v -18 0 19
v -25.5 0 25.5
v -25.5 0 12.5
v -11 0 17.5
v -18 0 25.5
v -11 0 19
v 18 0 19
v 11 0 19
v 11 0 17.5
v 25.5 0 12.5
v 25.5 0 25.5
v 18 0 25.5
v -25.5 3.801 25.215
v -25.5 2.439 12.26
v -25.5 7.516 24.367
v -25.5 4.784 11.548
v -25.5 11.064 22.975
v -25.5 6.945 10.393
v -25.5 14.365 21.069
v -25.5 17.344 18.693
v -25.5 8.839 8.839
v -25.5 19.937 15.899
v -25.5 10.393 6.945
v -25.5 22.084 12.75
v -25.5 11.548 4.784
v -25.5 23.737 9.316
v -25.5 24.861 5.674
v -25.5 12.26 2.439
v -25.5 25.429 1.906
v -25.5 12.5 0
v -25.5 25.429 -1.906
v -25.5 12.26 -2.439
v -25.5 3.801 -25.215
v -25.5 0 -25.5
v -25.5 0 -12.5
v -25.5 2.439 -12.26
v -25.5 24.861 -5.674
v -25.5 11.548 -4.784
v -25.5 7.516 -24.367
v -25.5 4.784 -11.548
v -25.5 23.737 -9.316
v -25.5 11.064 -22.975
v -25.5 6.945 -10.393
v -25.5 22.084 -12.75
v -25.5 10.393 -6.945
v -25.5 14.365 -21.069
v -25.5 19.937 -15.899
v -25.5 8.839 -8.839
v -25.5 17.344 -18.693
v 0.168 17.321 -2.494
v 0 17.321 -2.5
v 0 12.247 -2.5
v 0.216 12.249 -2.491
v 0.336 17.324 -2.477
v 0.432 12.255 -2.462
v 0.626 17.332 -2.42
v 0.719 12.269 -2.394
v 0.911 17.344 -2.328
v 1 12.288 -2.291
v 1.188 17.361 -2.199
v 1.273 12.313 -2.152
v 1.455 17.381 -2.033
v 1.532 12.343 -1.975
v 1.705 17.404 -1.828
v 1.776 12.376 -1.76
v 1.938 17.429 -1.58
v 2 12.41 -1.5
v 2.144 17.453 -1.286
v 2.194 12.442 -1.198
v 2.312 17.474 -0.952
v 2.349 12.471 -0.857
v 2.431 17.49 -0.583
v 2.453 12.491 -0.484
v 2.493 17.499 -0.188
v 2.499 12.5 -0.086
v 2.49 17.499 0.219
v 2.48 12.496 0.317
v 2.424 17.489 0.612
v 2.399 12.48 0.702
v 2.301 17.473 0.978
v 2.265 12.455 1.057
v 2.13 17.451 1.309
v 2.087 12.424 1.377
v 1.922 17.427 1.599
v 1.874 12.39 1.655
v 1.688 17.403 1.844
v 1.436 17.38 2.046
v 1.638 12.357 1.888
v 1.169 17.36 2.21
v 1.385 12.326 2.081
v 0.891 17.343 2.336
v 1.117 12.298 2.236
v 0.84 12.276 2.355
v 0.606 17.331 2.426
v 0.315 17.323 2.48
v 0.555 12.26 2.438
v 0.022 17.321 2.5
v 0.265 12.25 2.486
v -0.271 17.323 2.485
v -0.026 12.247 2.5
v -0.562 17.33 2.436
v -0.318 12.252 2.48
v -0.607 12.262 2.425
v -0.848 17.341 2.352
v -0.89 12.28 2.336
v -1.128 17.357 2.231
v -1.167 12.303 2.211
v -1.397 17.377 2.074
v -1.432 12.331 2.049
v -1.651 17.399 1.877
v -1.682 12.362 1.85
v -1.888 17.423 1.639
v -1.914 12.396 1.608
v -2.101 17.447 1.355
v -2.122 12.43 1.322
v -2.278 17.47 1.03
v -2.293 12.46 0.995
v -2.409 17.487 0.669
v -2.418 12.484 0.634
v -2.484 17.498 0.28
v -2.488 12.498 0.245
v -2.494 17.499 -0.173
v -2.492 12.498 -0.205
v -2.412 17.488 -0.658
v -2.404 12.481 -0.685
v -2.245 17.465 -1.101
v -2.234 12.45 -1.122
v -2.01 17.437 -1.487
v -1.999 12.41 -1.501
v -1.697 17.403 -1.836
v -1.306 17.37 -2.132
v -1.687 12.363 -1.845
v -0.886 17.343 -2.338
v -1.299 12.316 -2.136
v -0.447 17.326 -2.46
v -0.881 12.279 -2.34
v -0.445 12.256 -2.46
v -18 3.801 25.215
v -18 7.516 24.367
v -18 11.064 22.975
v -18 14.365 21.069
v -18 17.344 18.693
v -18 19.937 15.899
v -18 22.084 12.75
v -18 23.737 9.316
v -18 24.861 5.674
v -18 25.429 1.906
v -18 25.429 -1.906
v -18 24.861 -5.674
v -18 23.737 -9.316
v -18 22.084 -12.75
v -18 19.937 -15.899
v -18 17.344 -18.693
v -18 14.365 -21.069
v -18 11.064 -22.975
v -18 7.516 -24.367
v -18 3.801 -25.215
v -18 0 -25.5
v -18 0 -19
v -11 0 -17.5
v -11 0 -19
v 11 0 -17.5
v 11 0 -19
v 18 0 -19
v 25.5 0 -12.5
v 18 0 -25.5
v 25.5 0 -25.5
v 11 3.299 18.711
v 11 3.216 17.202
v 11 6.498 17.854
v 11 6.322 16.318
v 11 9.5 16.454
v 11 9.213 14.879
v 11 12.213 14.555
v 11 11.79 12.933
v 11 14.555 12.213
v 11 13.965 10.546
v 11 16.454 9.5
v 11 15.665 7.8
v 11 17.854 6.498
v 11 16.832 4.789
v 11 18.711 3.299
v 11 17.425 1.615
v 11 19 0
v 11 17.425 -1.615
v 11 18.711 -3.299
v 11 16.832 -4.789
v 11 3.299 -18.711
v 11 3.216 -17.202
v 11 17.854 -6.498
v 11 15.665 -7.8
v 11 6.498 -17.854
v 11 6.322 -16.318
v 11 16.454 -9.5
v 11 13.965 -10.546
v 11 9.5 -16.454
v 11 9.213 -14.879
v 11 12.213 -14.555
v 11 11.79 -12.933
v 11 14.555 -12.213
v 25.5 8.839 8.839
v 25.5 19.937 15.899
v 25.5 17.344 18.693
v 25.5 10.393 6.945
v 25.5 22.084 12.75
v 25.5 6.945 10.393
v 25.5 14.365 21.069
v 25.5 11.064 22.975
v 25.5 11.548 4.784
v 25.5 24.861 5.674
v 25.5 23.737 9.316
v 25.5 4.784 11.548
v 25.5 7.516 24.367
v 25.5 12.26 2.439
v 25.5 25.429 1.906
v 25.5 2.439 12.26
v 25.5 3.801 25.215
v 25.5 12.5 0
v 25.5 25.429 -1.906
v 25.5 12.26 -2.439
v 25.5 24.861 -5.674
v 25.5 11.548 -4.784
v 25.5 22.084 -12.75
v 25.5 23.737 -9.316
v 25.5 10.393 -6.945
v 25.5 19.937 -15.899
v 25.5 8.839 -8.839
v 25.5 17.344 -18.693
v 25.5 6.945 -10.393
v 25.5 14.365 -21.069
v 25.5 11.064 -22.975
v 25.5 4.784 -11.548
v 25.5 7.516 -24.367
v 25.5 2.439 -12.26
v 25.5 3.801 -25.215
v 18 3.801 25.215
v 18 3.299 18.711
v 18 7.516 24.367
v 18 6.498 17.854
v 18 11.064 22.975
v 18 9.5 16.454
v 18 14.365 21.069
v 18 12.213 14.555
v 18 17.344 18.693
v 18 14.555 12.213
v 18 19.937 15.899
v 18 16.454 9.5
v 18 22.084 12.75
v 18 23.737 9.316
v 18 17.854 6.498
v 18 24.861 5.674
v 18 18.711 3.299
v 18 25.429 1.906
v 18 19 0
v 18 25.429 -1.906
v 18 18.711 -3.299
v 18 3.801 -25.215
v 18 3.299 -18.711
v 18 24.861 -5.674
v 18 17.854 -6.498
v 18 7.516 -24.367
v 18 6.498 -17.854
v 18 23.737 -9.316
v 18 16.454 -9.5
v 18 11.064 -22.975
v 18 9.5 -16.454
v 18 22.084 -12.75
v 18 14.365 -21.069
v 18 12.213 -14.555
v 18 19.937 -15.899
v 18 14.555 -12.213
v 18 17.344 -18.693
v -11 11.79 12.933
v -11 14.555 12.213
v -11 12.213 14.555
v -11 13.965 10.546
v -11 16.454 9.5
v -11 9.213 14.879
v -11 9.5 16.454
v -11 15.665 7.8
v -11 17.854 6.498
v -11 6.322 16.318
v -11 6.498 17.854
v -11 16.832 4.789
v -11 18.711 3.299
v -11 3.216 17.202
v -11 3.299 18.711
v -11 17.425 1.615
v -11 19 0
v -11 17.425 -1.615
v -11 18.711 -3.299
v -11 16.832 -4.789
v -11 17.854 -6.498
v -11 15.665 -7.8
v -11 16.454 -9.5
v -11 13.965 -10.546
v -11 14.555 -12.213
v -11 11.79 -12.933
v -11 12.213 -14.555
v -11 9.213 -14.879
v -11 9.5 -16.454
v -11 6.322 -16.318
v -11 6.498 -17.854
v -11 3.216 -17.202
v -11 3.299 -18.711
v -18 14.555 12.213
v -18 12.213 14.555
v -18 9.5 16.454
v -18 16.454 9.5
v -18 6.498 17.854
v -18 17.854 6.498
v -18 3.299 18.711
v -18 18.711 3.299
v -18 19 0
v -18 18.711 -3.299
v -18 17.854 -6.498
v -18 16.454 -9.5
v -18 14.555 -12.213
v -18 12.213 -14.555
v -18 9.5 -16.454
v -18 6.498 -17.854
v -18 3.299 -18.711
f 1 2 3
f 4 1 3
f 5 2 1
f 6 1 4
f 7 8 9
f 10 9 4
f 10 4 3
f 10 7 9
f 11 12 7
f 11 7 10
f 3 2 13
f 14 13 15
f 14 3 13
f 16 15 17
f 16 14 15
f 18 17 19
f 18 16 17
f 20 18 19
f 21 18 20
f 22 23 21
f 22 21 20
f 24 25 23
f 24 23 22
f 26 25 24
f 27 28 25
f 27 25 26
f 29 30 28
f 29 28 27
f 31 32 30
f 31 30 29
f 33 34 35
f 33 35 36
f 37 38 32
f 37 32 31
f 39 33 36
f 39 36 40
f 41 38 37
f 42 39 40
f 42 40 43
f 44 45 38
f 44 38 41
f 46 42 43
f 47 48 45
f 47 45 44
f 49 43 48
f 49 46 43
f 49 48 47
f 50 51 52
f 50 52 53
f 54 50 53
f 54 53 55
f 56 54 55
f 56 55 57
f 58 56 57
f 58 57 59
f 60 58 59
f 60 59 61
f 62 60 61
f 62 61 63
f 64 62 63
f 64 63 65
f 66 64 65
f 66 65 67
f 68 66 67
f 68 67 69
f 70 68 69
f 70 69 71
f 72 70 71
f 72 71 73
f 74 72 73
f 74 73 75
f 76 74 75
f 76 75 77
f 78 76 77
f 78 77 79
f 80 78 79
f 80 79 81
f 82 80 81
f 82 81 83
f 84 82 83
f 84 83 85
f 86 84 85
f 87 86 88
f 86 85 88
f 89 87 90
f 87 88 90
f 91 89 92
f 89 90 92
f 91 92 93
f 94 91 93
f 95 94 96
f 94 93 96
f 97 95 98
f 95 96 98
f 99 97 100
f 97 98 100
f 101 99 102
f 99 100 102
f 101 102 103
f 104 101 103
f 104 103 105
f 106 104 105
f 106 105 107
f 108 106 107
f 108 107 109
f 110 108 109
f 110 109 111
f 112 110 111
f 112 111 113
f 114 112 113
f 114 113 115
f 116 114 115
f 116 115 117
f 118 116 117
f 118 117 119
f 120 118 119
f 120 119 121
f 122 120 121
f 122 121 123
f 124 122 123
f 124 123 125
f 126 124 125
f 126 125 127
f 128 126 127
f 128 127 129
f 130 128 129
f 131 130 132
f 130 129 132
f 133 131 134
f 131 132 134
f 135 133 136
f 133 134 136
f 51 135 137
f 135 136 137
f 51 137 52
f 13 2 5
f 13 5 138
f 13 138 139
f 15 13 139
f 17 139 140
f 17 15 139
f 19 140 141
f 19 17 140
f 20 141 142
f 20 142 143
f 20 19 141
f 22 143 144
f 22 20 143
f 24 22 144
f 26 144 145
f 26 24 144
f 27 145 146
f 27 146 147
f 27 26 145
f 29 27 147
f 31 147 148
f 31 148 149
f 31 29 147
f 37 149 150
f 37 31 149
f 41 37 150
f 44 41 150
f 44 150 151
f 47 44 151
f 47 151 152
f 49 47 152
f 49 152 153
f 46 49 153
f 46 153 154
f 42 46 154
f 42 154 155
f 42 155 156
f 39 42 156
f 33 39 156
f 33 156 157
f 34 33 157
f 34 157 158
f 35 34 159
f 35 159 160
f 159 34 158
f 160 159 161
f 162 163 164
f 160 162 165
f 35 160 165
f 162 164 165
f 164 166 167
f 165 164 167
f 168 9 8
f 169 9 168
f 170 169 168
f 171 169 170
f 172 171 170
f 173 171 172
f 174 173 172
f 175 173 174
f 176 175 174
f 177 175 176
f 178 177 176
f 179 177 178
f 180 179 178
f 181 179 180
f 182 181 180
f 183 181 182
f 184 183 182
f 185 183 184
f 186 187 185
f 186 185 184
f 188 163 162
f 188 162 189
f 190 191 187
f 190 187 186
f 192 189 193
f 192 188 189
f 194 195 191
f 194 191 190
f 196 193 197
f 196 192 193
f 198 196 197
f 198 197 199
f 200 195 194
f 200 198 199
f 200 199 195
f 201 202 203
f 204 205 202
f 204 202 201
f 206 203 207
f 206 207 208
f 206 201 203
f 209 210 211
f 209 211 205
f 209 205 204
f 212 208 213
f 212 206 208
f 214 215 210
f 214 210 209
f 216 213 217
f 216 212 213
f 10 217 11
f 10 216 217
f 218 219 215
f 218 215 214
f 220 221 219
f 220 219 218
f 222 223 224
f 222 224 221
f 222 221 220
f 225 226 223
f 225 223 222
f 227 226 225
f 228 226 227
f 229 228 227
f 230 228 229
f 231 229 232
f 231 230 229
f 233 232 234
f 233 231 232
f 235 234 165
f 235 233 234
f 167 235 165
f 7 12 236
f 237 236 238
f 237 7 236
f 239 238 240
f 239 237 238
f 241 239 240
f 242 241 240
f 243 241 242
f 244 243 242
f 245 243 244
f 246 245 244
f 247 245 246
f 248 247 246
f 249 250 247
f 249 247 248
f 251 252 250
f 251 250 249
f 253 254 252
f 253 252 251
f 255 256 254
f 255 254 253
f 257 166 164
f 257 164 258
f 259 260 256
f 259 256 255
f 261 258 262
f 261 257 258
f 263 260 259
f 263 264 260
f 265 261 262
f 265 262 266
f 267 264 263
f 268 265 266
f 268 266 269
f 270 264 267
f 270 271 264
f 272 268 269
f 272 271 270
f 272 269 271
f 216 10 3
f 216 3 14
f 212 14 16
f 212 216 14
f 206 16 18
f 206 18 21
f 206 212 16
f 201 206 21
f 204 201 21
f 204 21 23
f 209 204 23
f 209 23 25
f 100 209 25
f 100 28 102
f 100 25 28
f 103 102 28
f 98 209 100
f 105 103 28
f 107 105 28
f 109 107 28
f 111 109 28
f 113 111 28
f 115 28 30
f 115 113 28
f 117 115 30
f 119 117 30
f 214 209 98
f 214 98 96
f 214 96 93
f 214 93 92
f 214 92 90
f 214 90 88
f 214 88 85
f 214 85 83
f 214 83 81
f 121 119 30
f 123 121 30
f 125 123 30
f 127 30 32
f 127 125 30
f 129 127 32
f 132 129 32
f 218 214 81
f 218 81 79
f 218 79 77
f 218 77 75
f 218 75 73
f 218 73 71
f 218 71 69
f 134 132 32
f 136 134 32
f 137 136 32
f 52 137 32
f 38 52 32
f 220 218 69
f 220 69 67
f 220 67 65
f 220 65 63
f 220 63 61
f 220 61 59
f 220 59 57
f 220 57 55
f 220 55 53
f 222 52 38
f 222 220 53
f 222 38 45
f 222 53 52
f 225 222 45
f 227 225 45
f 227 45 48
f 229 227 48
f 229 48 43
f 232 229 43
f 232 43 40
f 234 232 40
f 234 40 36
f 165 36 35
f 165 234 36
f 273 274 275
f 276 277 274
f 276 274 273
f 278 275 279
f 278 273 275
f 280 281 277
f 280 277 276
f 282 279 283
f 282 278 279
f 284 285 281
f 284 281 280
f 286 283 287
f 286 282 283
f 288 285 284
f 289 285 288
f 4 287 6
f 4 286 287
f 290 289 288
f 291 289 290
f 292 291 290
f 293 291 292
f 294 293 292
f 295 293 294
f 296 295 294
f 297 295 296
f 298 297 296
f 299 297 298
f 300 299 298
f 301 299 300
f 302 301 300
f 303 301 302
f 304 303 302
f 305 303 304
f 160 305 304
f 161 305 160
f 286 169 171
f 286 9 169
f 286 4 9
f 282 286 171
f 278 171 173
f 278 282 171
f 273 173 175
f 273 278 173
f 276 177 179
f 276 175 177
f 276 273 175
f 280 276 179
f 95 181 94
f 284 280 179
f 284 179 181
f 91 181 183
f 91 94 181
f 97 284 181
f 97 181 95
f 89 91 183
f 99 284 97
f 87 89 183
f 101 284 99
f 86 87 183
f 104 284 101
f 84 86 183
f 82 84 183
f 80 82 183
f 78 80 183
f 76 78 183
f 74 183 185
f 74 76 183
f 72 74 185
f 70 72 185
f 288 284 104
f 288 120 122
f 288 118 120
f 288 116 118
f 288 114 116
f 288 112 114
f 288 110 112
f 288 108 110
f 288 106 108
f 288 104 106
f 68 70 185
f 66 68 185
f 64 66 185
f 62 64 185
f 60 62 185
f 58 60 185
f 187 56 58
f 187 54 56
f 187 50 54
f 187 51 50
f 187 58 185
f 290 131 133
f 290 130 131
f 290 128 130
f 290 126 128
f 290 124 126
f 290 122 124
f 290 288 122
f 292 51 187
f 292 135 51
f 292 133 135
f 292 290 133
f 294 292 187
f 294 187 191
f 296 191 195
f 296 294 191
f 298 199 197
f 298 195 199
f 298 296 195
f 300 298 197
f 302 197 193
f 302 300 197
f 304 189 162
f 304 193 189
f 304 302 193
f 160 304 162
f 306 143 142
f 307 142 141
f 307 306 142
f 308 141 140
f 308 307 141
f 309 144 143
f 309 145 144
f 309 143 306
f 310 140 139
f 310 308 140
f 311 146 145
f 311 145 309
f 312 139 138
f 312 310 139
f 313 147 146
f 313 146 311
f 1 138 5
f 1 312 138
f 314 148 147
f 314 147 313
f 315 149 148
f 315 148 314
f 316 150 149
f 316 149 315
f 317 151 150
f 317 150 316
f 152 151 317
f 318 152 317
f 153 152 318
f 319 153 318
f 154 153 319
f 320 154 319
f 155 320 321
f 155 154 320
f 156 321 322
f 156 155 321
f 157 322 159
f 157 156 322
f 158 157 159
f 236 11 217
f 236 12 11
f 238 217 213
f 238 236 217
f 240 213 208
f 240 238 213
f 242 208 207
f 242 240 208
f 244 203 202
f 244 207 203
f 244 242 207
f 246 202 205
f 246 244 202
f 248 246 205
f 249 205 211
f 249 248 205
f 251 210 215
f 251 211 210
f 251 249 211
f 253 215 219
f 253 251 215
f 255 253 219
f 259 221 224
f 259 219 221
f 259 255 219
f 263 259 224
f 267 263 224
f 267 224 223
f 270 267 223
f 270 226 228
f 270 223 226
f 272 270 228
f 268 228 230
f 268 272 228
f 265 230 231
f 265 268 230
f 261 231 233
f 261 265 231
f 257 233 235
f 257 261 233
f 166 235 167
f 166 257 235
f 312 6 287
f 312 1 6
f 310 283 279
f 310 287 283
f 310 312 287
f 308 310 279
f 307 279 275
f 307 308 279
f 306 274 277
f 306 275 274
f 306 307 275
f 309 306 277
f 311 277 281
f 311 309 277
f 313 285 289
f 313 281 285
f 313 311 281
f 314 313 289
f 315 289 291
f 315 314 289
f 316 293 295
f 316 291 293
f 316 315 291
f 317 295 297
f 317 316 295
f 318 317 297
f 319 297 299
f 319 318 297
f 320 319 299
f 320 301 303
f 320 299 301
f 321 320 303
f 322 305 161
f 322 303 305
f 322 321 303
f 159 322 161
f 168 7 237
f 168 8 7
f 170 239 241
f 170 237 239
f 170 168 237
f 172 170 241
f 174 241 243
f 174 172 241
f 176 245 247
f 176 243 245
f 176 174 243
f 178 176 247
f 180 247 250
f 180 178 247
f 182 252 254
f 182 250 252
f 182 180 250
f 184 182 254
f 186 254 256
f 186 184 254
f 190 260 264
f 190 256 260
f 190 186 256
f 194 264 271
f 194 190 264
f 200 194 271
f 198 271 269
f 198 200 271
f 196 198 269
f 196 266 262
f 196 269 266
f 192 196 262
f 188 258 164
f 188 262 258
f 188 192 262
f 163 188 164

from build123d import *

# Parameters (mm, degrees)
REVOLVE1_ANGLE            = 180
F_5_0MM_DOWEL_HOLE1_D     = 5
F_5_0MM_DOWEL_HOLE1_DEPTH = 6
F_5_0MM_DOWEL_HOLE1_TIP   = 1.502151548


with BuildPart() as part:
    # Sketch1 → Revolve1 (revolve, symmetric)
    with BuildSketch(Plane.XY) as revolve1_sk:
        Polygon((-25.5, 12.5), (25.5, 12.5), (25.5, 25.5), (18, 25.5), (18, 19), (11, 19), (11, 17.5), (-11, 17.5), (-11, 19), (-18, 19), (-18, 25.5), (-25.5, 25.5), align=None)
    revolve(axis=Axis((0, 0, 0), (1, 0, 0)), revolution_arc=REVOLVE1_ANGLE / 2)
    revolve(revolve1_sk.sketch, axis=Axis((0, 0, 0), (-1, 0, 0)), revolution_arc=REVOLVE1_ANGLE / 2)

    # Ø5.0mm Dowel Hole1
    with Locations(Plane.ZX.offset(17.5)):
        with Locations((0, 0)):
            Hole(F_5_0MM_DOWEL_HOLE1_D / 2, depth=F_5_0MM_DOWEL_HOLE1_DEPTH)
            with Locations((0, 0, -(F_5_0MM_DOWEL_HOLE1_DEPTH + F_5_0MM_DOWEL_HOLE1_TIP / 2))):  # 118° drill point
                Cone(0, F_5_0MM_DOWEL_HOLE1_D / 2, F_5_0MM_DOWEL_HOLE1_TIP, mode=Mode.SUBTRACT)


solid = part.part
